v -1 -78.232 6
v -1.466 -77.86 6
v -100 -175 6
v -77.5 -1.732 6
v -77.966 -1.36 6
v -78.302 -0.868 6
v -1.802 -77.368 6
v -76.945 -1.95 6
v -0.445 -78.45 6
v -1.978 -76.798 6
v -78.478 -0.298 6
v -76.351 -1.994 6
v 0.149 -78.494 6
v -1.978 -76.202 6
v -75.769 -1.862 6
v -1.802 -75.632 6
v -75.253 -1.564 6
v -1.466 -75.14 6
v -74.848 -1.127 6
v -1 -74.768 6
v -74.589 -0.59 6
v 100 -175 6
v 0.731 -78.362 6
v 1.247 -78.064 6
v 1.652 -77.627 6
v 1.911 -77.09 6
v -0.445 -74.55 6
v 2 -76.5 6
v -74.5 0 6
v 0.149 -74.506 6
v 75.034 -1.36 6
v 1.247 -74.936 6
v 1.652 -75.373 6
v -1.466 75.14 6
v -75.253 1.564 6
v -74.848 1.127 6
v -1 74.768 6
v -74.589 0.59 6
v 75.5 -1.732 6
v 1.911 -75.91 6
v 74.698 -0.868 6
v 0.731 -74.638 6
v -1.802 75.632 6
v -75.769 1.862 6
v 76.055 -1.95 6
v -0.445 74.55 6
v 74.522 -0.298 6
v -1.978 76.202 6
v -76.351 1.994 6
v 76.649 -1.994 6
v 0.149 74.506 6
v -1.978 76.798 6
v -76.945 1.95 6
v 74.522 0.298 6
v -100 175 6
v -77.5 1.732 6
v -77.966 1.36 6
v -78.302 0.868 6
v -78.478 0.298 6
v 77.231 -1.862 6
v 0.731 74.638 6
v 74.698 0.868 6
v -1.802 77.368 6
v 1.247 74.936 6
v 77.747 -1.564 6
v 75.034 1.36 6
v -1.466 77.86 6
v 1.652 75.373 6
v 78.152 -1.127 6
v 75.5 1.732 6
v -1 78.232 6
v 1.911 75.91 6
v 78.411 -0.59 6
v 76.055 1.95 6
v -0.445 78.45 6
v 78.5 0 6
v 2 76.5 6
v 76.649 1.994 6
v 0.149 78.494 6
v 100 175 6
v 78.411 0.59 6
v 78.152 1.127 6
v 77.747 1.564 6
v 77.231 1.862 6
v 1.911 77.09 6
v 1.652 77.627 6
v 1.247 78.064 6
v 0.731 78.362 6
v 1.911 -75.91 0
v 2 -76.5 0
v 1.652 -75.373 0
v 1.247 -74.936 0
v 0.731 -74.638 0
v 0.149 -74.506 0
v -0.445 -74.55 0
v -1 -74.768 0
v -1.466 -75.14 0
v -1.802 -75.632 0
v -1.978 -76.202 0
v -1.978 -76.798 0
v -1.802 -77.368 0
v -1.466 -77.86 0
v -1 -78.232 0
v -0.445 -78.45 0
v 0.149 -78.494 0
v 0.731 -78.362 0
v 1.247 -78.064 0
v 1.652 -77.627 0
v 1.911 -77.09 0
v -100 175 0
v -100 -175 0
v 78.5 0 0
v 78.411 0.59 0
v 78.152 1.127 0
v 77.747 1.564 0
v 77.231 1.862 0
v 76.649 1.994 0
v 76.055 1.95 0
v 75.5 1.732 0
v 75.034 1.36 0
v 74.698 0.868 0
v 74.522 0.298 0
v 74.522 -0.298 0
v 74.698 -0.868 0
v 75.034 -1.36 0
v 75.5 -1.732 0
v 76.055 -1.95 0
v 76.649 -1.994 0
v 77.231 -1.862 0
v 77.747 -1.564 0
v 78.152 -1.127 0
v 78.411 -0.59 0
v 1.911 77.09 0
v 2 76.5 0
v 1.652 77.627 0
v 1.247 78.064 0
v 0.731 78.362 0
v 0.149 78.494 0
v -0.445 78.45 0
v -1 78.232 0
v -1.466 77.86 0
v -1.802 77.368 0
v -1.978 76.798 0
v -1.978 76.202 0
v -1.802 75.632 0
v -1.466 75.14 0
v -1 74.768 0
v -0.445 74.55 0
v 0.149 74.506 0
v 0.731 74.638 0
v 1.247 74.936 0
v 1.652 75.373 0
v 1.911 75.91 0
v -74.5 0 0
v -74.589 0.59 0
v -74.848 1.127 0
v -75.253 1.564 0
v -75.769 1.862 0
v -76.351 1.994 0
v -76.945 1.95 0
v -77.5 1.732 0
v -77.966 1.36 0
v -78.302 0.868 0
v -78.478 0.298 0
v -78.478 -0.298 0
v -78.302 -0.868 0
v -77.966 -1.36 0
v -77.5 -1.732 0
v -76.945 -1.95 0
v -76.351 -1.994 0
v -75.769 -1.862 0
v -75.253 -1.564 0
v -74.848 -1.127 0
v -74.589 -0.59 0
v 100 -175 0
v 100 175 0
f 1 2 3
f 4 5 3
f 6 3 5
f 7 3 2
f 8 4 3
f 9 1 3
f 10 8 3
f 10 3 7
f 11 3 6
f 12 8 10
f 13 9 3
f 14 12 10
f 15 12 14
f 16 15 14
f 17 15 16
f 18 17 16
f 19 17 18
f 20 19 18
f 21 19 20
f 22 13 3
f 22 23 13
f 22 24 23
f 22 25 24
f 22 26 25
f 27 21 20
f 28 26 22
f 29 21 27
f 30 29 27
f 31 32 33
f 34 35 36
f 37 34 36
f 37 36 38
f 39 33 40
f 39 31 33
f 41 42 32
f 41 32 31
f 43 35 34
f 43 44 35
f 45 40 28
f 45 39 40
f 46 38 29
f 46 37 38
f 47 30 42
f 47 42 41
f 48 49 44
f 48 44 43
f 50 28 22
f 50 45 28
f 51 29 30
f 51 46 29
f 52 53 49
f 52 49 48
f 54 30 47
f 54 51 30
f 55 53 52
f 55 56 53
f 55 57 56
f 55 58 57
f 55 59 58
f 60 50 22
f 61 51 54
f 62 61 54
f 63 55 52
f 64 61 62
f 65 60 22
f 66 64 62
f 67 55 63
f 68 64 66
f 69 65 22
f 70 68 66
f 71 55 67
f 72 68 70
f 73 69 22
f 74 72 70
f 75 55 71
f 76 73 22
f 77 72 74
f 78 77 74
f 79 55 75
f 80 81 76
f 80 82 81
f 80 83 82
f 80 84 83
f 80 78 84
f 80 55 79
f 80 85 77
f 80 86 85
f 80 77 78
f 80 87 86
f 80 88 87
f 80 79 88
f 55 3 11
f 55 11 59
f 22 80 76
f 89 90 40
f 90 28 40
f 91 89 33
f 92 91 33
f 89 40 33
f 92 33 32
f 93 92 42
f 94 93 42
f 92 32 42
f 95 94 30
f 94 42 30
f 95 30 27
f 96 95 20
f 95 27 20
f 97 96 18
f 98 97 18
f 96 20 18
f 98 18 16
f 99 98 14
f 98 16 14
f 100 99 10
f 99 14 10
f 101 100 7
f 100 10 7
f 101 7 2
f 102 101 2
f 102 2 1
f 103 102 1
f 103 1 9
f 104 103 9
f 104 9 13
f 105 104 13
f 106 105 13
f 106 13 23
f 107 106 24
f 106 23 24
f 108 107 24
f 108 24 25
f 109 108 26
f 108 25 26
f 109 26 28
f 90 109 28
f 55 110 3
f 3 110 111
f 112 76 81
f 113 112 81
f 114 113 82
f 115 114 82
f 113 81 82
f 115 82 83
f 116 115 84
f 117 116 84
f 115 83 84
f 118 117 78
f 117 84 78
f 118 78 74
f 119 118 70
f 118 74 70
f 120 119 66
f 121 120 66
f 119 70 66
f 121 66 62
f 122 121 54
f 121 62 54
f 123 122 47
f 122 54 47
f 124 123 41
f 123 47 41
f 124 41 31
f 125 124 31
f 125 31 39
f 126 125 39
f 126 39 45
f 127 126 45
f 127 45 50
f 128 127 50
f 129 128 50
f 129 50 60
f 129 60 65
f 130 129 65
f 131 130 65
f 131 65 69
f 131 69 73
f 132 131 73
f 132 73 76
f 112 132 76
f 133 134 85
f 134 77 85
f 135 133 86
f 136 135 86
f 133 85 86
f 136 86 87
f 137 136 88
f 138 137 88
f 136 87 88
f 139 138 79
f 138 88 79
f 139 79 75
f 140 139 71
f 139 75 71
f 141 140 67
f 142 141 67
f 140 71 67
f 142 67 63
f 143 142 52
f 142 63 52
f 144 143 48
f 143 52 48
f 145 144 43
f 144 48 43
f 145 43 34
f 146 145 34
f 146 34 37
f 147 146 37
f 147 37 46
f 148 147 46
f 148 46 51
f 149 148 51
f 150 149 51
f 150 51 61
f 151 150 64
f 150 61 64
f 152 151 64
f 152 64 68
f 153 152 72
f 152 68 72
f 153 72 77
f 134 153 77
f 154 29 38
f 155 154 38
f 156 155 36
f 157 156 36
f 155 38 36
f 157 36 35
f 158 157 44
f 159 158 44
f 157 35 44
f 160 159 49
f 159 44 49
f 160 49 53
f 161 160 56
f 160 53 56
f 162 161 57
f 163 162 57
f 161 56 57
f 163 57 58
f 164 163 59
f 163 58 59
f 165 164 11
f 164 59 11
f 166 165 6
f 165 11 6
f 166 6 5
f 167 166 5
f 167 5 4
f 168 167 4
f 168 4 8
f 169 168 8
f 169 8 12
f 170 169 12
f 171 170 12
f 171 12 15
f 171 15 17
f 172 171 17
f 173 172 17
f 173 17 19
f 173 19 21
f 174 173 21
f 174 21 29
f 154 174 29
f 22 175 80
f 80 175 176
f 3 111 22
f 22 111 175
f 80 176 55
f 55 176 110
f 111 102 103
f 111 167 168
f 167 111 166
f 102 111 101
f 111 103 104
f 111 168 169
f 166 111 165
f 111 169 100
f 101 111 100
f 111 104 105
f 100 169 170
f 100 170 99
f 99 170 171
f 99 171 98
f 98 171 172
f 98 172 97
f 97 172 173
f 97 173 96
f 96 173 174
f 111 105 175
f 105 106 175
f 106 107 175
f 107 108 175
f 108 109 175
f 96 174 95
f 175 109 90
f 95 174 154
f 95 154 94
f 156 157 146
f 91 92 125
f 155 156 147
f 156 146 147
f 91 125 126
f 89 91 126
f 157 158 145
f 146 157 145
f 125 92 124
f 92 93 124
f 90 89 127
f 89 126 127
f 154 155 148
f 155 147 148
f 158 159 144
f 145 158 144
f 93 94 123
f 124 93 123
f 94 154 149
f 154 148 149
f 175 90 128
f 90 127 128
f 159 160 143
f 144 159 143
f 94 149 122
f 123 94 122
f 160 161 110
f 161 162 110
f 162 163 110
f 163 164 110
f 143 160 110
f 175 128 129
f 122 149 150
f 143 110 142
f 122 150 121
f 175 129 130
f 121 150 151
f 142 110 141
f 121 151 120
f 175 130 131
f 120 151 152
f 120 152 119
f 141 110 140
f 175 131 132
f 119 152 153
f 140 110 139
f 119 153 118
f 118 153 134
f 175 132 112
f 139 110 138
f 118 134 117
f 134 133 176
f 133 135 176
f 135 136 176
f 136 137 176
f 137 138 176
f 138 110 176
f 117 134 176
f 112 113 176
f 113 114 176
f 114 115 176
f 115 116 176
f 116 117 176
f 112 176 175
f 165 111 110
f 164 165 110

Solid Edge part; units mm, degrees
sketch "Sketch1" plane through (0, 0, 0) normal (0, 0, 1) x (1, 0, 0)
  line L0 (-100, -175) -> (100, -175)
  line L1 (100, -175) -> (100, 175)
  line L2 (100, 175) -> (-100, 175)
  line L3 (-100, 175) -> (-100, -175)
  dimension "D1" = 350
  dimension "D2" = 200
extrude "Protrusion1" add sketch "Sketch1" along normal blind 6
sketch "Sketch2" plane through (0, 0, 6) normal (0, 0, 1) x (1, 0, 0)
  circle A0 centre (-76.5, 0) radius 2
  circle A1 centre (-76.5, 0) radius 2
  circle A2 centre (-76.5, 0) radius 2
  circle A3 centre (76.5, 0) radius 2
  circle A4 centre (0, 76.5) radius 2
  circle A5 centre (0, -76.5) radius 2
extrude "Cutout1" cut sketch "Sketch2" against normal up to next
